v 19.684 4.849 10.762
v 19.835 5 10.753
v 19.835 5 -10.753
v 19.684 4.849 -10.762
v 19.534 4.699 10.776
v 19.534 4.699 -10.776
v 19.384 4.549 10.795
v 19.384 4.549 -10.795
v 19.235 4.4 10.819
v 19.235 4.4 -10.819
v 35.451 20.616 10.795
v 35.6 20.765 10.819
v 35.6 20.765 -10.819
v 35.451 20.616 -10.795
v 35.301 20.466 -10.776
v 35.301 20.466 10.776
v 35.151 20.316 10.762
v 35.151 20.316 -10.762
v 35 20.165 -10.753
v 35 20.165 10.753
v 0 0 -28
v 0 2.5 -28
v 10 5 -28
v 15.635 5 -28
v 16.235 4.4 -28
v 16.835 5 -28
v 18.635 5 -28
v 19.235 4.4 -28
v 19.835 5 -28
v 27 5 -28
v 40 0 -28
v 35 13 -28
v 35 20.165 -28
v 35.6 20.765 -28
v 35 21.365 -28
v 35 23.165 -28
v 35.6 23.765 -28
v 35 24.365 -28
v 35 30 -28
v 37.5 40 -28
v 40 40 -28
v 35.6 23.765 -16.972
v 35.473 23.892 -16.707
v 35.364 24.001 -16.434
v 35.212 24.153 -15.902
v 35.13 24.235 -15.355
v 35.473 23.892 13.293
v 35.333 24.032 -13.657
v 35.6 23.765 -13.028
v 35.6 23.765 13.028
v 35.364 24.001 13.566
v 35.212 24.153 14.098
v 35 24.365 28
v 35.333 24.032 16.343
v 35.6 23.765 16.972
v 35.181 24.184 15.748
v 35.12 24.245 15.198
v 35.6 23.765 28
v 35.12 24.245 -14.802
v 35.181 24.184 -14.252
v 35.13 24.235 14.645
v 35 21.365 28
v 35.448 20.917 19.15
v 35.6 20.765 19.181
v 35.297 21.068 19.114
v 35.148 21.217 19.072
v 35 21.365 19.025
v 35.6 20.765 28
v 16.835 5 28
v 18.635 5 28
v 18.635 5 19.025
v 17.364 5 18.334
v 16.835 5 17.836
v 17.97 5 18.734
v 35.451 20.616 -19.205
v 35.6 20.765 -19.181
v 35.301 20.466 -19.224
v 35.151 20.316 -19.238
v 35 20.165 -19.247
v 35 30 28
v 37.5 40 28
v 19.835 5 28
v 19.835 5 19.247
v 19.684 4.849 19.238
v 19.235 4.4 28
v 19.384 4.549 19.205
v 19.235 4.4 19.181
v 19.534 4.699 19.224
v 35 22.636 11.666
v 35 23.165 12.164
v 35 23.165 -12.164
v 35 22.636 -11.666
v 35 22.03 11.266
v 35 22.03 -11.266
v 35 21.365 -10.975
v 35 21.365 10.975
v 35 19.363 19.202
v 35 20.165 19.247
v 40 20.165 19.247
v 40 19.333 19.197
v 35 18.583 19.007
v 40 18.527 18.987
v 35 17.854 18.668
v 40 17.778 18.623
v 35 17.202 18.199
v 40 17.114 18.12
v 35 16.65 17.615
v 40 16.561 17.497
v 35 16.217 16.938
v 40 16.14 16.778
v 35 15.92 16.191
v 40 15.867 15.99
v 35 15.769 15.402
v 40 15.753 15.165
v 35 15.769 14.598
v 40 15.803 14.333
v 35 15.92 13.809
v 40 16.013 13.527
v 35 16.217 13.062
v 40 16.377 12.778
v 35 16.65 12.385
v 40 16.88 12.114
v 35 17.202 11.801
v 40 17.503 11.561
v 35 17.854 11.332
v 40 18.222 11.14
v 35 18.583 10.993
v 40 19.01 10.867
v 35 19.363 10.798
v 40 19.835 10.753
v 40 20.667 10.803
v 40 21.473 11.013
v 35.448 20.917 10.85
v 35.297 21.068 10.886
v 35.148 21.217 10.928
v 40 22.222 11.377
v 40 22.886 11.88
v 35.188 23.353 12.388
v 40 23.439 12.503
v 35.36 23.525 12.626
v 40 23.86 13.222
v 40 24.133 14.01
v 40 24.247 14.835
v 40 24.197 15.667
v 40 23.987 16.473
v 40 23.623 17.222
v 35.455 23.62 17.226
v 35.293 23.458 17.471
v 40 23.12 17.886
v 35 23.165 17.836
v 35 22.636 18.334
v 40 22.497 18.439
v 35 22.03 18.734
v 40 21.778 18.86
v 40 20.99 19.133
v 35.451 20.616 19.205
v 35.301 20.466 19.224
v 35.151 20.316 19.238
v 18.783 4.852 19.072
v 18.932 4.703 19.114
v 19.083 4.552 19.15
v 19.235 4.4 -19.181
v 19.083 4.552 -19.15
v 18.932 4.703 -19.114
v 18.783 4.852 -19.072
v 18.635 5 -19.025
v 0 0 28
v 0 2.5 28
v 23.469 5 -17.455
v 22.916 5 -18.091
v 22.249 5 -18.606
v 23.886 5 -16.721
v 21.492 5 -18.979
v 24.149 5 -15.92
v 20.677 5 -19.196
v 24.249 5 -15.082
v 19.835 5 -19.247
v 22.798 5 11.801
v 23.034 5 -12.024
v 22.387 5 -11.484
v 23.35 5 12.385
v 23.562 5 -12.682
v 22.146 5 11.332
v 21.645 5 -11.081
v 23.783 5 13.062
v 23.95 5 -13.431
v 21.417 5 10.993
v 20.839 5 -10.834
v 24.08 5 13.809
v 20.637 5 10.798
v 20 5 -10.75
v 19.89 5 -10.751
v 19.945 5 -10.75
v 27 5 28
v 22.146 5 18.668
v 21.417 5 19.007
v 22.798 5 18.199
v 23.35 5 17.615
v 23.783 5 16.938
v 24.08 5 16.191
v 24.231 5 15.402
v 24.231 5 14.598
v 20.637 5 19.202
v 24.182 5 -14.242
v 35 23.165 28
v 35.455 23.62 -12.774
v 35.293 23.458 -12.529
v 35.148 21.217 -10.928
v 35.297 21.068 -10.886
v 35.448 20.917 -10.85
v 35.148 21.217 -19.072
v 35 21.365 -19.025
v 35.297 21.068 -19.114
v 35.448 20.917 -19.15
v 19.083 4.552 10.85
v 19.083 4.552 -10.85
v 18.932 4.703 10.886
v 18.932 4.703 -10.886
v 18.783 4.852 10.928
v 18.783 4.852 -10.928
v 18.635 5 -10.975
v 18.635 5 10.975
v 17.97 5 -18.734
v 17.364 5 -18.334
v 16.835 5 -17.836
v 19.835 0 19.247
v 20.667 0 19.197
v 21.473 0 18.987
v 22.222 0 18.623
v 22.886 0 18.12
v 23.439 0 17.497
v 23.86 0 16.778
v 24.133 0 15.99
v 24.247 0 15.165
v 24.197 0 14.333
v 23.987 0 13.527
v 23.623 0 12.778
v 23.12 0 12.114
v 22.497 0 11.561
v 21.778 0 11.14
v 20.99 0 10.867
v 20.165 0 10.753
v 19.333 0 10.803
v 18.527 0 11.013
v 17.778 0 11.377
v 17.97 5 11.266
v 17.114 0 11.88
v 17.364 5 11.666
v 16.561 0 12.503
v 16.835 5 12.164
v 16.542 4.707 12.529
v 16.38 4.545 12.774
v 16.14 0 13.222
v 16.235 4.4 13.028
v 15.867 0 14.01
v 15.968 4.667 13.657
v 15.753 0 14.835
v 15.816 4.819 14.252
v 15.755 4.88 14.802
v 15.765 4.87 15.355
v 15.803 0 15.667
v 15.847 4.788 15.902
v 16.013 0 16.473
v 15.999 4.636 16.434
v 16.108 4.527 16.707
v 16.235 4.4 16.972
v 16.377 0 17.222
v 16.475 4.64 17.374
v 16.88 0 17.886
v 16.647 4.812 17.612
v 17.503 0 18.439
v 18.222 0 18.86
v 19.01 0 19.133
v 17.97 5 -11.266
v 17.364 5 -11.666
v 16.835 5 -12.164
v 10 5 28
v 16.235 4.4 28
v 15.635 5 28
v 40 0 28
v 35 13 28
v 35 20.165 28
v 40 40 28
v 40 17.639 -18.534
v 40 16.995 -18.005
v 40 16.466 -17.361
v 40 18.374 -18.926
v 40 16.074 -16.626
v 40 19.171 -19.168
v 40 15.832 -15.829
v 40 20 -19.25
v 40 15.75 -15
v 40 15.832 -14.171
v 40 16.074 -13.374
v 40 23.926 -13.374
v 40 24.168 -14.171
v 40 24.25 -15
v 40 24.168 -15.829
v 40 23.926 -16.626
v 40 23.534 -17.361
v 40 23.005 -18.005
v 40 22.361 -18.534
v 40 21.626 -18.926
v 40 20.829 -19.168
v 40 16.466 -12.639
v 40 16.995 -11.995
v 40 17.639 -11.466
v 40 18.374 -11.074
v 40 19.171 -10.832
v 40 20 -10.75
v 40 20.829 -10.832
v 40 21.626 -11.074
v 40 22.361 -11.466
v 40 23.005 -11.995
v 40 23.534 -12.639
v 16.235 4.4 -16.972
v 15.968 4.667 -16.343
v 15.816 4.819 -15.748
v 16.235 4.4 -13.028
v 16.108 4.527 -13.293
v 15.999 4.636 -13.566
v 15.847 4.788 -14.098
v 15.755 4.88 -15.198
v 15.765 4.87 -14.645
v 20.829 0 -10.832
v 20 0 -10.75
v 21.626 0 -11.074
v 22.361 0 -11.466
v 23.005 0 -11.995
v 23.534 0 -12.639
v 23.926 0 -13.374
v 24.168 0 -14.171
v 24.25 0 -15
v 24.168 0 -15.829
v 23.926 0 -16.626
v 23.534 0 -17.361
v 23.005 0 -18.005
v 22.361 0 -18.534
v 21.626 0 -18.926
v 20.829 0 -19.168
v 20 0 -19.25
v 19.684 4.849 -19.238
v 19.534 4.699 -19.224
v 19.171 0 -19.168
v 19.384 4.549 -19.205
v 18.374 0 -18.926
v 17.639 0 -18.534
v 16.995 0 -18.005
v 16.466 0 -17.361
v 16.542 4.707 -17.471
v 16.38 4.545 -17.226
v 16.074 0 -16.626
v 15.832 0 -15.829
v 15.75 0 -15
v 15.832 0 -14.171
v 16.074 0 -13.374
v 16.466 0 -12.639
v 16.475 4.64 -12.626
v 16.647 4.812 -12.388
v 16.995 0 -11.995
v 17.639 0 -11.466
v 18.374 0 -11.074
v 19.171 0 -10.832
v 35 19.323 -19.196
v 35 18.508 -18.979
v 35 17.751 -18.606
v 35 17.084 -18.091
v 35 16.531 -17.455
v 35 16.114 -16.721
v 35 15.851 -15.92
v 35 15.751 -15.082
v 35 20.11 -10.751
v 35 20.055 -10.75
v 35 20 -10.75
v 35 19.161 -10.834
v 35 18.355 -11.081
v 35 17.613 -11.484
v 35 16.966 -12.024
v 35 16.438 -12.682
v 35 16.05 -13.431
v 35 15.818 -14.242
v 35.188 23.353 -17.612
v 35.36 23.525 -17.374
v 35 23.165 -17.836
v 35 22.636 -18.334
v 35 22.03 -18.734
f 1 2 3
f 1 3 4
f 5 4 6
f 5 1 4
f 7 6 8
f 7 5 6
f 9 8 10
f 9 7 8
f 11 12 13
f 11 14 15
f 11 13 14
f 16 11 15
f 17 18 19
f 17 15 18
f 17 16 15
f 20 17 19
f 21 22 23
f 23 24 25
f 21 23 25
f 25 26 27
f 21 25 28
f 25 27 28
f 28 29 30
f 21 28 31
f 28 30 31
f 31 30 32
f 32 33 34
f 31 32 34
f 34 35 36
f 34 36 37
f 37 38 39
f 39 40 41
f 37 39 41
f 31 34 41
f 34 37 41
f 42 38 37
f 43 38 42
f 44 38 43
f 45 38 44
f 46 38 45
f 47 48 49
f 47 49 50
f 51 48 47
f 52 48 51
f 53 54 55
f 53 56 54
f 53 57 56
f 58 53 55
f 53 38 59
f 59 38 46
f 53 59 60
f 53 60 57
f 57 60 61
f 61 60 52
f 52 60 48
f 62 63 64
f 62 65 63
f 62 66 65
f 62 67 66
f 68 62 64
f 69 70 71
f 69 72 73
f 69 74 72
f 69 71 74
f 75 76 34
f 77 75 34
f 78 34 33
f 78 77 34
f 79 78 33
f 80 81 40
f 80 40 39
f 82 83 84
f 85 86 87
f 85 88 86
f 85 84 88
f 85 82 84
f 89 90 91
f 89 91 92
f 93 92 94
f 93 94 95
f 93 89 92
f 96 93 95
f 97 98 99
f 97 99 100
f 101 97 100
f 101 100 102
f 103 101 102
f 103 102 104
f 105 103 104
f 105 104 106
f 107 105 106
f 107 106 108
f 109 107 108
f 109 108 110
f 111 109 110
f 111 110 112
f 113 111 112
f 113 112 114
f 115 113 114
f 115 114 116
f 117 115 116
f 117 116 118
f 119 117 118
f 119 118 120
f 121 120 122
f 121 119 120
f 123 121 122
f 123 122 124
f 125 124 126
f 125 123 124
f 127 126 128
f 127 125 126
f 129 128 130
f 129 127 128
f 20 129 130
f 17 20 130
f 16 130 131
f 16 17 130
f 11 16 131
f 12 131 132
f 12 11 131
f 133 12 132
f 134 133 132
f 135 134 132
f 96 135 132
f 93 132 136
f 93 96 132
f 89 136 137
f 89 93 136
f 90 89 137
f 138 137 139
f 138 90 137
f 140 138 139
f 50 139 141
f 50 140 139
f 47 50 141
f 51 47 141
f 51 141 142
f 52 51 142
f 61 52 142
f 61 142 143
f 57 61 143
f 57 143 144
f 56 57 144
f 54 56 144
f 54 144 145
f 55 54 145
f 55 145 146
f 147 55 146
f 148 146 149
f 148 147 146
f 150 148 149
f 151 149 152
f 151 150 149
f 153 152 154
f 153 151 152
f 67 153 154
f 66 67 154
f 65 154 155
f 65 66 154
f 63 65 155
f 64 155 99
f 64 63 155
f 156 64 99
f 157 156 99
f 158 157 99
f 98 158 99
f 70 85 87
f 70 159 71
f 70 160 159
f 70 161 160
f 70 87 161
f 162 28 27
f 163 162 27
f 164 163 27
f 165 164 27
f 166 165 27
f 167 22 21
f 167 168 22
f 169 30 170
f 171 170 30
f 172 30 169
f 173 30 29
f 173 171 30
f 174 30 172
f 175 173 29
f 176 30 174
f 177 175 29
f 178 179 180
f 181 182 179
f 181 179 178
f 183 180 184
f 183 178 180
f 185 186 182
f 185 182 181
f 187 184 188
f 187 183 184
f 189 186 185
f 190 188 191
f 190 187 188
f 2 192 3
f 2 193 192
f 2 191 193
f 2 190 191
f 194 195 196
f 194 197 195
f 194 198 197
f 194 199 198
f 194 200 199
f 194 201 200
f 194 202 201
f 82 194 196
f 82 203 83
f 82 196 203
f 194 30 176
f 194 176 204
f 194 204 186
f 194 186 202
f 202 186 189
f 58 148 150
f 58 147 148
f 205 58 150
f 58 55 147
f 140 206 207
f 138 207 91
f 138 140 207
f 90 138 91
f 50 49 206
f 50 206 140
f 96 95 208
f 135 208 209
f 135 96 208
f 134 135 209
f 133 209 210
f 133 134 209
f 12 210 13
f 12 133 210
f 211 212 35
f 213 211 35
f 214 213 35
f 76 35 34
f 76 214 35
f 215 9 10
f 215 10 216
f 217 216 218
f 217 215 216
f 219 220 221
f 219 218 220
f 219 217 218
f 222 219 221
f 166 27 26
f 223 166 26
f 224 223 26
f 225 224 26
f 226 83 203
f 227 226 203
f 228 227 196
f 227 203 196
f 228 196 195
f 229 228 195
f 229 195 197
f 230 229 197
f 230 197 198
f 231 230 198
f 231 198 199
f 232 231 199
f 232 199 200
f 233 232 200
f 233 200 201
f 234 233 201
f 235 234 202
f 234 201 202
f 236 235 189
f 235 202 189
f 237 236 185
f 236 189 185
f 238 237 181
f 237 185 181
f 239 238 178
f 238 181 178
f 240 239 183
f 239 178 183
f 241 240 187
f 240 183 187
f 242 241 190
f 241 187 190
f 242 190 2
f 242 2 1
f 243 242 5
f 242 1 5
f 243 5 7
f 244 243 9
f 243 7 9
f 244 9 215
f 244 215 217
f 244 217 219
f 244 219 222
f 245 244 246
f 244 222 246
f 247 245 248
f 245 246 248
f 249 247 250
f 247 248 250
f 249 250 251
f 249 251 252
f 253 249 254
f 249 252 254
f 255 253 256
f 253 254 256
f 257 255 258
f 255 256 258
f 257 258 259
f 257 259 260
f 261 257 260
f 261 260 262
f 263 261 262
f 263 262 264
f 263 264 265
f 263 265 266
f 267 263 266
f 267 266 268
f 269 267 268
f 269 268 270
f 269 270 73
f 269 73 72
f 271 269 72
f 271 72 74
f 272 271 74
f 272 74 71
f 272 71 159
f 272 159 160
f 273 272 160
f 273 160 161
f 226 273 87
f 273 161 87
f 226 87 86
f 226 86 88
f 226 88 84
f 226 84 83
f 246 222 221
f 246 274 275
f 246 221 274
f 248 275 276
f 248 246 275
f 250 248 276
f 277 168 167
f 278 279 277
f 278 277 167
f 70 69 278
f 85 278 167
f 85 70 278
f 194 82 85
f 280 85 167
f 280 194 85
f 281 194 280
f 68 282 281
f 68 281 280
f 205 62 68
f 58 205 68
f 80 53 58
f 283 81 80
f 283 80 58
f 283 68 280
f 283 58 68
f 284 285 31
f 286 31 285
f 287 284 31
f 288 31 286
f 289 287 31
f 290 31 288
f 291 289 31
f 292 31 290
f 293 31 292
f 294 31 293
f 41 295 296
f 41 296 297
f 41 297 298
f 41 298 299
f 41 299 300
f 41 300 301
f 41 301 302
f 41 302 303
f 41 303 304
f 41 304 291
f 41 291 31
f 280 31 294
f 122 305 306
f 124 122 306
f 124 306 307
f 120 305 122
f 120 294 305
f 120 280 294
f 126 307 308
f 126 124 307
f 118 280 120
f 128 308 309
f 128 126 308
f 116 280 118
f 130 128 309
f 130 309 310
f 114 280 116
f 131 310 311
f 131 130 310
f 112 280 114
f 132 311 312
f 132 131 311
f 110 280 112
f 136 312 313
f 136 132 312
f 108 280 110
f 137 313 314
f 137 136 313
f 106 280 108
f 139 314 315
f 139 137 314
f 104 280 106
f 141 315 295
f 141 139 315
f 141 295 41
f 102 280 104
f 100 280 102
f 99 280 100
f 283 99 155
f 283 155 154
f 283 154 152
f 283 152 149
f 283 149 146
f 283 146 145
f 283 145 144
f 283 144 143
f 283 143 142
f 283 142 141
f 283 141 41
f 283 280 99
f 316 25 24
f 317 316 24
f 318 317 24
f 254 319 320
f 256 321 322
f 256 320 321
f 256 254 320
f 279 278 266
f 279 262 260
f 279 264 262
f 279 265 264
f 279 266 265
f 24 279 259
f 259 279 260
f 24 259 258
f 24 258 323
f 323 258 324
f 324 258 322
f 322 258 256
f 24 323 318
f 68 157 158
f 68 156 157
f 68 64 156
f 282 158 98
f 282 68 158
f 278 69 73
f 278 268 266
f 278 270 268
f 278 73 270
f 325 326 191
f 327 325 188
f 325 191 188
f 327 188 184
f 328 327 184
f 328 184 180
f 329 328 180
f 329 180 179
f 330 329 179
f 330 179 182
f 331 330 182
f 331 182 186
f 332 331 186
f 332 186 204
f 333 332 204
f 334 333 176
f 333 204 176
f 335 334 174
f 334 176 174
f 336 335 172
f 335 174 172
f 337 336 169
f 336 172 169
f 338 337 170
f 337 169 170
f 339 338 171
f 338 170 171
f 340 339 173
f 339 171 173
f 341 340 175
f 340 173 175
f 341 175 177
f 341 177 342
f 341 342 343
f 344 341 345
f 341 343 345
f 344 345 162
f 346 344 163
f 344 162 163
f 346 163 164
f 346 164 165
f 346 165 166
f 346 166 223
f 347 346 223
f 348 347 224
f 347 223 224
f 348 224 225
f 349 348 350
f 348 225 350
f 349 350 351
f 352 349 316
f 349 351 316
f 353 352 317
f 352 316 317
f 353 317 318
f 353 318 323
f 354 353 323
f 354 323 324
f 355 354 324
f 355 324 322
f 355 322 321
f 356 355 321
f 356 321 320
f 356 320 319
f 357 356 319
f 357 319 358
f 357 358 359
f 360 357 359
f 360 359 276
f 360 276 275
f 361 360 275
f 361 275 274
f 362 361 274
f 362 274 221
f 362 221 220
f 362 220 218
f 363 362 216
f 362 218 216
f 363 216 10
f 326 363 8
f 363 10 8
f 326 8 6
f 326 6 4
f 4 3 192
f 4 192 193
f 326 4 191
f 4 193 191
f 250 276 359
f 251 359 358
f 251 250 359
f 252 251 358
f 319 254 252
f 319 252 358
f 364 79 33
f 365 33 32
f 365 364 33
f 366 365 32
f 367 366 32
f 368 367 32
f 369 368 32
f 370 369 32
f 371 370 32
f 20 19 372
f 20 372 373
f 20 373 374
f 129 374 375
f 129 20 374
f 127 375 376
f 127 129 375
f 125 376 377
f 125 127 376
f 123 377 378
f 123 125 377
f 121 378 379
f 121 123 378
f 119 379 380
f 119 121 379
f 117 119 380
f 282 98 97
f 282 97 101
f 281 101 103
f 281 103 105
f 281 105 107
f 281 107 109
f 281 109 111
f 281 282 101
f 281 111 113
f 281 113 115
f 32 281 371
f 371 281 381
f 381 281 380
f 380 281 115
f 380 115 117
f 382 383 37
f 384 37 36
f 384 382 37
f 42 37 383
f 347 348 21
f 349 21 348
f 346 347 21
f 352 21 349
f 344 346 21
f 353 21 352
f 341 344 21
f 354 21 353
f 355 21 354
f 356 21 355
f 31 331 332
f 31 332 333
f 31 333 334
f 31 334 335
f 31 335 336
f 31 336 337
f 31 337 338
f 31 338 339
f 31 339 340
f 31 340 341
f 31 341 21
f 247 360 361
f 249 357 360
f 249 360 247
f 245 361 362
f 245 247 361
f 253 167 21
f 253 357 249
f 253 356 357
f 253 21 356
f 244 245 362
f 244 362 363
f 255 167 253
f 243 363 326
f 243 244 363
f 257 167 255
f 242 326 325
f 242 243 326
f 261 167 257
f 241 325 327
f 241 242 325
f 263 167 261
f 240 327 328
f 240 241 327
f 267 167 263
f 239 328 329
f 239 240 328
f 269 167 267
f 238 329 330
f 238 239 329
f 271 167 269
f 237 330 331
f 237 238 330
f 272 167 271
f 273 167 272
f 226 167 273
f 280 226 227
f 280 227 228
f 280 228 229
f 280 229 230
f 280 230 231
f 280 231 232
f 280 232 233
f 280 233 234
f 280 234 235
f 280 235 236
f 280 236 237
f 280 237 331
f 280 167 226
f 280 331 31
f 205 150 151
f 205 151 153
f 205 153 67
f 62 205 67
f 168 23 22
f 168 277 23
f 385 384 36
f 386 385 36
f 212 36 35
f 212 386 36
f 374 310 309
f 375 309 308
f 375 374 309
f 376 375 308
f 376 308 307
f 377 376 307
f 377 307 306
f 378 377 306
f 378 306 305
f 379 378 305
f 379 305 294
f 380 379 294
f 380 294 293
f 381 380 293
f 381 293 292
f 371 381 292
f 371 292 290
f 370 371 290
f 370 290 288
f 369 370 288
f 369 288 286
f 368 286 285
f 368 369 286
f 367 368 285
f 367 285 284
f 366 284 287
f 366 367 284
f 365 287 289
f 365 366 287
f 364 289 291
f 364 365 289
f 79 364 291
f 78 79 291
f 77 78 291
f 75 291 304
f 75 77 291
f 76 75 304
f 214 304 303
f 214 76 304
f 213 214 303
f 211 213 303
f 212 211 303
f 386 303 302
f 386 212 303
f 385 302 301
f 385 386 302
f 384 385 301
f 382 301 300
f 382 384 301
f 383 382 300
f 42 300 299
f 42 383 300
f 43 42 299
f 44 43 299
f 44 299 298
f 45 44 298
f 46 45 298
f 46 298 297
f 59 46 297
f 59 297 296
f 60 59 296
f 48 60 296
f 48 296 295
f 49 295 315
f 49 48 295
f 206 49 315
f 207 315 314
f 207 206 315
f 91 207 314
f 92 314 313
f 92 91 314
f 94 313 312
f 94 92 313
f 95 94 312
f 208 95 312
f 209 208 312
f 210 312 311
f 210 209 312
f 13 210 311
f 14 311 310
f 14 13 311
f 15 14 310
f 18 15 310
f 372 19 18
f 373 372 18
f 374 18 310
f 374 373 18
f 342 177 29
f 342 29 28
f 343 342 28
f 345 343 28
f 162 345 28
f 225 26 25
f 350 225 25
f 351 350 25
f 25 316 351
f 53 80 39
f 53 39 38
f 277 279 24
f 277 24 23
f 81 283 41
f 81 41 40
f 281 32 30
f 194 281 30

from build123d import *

# Parameters (mm, degrees)
EXTRUDE_1_DEPTH     = 28
SKETCH_3_R          = 4.25
CUT_EXTRUDE_1_DEPTH = 61.074953184


with BuildPart() as part:
    # 草图1 → 凸台-拉伸1 (new, symmetric)
    with BuildSketch(Plane.XY):
        Polygon((0, 0), (40, 0), (40, 40), (37.5, 40), (35, 30), (35, 24.364950833), (35.6, 23.764950833), (35, 23.164950833), (35, 21.364950833), (35.6, 20.764950833), (35, 20.164950833), (35, 13), (27, 5), (19.835049167, 5), (19.235049167, 4.4), (18.635049167, 5), (16.835049167, 5), (16.235049167, 4.4), (15.635049167, 5), (10, 5), (0, 2.5), align=None)
    extrude(amount=EXTRUDE_1_DEPTH, both=True)

    # 草图3 → 切除-拉伸1 (cut, through all)
    with BuildSketch(Plane(origin=(0, 5, 0), x_dir=(1, 0, 0), z_dir=(0, 1, 0))):
        with Locations(Location((20, 15, 0), (0, 0, 270))):
            Circle(SKETCH_3_R)
        with Locations(Location((20, -15, 0), (0, 0, 267.775679771))):
            Circle(SKETCH_3_R)
    cut_extrude_1 = extrude(amount=-CUT_EXTRUDE_1_DEPTH, mode=Mode.SUBTRACT)

    # 镜向1: 切除-拉伸1 across plane
    add(cut_extrude_1.mirror(Plane(origin=(20, 20, 0), x_dir=(0, 0, 1), z_dir=(-0.7071067811865414, -0.7071067811865538, 0))), mode=Mode.SUBTRACT)


solid = part.part
